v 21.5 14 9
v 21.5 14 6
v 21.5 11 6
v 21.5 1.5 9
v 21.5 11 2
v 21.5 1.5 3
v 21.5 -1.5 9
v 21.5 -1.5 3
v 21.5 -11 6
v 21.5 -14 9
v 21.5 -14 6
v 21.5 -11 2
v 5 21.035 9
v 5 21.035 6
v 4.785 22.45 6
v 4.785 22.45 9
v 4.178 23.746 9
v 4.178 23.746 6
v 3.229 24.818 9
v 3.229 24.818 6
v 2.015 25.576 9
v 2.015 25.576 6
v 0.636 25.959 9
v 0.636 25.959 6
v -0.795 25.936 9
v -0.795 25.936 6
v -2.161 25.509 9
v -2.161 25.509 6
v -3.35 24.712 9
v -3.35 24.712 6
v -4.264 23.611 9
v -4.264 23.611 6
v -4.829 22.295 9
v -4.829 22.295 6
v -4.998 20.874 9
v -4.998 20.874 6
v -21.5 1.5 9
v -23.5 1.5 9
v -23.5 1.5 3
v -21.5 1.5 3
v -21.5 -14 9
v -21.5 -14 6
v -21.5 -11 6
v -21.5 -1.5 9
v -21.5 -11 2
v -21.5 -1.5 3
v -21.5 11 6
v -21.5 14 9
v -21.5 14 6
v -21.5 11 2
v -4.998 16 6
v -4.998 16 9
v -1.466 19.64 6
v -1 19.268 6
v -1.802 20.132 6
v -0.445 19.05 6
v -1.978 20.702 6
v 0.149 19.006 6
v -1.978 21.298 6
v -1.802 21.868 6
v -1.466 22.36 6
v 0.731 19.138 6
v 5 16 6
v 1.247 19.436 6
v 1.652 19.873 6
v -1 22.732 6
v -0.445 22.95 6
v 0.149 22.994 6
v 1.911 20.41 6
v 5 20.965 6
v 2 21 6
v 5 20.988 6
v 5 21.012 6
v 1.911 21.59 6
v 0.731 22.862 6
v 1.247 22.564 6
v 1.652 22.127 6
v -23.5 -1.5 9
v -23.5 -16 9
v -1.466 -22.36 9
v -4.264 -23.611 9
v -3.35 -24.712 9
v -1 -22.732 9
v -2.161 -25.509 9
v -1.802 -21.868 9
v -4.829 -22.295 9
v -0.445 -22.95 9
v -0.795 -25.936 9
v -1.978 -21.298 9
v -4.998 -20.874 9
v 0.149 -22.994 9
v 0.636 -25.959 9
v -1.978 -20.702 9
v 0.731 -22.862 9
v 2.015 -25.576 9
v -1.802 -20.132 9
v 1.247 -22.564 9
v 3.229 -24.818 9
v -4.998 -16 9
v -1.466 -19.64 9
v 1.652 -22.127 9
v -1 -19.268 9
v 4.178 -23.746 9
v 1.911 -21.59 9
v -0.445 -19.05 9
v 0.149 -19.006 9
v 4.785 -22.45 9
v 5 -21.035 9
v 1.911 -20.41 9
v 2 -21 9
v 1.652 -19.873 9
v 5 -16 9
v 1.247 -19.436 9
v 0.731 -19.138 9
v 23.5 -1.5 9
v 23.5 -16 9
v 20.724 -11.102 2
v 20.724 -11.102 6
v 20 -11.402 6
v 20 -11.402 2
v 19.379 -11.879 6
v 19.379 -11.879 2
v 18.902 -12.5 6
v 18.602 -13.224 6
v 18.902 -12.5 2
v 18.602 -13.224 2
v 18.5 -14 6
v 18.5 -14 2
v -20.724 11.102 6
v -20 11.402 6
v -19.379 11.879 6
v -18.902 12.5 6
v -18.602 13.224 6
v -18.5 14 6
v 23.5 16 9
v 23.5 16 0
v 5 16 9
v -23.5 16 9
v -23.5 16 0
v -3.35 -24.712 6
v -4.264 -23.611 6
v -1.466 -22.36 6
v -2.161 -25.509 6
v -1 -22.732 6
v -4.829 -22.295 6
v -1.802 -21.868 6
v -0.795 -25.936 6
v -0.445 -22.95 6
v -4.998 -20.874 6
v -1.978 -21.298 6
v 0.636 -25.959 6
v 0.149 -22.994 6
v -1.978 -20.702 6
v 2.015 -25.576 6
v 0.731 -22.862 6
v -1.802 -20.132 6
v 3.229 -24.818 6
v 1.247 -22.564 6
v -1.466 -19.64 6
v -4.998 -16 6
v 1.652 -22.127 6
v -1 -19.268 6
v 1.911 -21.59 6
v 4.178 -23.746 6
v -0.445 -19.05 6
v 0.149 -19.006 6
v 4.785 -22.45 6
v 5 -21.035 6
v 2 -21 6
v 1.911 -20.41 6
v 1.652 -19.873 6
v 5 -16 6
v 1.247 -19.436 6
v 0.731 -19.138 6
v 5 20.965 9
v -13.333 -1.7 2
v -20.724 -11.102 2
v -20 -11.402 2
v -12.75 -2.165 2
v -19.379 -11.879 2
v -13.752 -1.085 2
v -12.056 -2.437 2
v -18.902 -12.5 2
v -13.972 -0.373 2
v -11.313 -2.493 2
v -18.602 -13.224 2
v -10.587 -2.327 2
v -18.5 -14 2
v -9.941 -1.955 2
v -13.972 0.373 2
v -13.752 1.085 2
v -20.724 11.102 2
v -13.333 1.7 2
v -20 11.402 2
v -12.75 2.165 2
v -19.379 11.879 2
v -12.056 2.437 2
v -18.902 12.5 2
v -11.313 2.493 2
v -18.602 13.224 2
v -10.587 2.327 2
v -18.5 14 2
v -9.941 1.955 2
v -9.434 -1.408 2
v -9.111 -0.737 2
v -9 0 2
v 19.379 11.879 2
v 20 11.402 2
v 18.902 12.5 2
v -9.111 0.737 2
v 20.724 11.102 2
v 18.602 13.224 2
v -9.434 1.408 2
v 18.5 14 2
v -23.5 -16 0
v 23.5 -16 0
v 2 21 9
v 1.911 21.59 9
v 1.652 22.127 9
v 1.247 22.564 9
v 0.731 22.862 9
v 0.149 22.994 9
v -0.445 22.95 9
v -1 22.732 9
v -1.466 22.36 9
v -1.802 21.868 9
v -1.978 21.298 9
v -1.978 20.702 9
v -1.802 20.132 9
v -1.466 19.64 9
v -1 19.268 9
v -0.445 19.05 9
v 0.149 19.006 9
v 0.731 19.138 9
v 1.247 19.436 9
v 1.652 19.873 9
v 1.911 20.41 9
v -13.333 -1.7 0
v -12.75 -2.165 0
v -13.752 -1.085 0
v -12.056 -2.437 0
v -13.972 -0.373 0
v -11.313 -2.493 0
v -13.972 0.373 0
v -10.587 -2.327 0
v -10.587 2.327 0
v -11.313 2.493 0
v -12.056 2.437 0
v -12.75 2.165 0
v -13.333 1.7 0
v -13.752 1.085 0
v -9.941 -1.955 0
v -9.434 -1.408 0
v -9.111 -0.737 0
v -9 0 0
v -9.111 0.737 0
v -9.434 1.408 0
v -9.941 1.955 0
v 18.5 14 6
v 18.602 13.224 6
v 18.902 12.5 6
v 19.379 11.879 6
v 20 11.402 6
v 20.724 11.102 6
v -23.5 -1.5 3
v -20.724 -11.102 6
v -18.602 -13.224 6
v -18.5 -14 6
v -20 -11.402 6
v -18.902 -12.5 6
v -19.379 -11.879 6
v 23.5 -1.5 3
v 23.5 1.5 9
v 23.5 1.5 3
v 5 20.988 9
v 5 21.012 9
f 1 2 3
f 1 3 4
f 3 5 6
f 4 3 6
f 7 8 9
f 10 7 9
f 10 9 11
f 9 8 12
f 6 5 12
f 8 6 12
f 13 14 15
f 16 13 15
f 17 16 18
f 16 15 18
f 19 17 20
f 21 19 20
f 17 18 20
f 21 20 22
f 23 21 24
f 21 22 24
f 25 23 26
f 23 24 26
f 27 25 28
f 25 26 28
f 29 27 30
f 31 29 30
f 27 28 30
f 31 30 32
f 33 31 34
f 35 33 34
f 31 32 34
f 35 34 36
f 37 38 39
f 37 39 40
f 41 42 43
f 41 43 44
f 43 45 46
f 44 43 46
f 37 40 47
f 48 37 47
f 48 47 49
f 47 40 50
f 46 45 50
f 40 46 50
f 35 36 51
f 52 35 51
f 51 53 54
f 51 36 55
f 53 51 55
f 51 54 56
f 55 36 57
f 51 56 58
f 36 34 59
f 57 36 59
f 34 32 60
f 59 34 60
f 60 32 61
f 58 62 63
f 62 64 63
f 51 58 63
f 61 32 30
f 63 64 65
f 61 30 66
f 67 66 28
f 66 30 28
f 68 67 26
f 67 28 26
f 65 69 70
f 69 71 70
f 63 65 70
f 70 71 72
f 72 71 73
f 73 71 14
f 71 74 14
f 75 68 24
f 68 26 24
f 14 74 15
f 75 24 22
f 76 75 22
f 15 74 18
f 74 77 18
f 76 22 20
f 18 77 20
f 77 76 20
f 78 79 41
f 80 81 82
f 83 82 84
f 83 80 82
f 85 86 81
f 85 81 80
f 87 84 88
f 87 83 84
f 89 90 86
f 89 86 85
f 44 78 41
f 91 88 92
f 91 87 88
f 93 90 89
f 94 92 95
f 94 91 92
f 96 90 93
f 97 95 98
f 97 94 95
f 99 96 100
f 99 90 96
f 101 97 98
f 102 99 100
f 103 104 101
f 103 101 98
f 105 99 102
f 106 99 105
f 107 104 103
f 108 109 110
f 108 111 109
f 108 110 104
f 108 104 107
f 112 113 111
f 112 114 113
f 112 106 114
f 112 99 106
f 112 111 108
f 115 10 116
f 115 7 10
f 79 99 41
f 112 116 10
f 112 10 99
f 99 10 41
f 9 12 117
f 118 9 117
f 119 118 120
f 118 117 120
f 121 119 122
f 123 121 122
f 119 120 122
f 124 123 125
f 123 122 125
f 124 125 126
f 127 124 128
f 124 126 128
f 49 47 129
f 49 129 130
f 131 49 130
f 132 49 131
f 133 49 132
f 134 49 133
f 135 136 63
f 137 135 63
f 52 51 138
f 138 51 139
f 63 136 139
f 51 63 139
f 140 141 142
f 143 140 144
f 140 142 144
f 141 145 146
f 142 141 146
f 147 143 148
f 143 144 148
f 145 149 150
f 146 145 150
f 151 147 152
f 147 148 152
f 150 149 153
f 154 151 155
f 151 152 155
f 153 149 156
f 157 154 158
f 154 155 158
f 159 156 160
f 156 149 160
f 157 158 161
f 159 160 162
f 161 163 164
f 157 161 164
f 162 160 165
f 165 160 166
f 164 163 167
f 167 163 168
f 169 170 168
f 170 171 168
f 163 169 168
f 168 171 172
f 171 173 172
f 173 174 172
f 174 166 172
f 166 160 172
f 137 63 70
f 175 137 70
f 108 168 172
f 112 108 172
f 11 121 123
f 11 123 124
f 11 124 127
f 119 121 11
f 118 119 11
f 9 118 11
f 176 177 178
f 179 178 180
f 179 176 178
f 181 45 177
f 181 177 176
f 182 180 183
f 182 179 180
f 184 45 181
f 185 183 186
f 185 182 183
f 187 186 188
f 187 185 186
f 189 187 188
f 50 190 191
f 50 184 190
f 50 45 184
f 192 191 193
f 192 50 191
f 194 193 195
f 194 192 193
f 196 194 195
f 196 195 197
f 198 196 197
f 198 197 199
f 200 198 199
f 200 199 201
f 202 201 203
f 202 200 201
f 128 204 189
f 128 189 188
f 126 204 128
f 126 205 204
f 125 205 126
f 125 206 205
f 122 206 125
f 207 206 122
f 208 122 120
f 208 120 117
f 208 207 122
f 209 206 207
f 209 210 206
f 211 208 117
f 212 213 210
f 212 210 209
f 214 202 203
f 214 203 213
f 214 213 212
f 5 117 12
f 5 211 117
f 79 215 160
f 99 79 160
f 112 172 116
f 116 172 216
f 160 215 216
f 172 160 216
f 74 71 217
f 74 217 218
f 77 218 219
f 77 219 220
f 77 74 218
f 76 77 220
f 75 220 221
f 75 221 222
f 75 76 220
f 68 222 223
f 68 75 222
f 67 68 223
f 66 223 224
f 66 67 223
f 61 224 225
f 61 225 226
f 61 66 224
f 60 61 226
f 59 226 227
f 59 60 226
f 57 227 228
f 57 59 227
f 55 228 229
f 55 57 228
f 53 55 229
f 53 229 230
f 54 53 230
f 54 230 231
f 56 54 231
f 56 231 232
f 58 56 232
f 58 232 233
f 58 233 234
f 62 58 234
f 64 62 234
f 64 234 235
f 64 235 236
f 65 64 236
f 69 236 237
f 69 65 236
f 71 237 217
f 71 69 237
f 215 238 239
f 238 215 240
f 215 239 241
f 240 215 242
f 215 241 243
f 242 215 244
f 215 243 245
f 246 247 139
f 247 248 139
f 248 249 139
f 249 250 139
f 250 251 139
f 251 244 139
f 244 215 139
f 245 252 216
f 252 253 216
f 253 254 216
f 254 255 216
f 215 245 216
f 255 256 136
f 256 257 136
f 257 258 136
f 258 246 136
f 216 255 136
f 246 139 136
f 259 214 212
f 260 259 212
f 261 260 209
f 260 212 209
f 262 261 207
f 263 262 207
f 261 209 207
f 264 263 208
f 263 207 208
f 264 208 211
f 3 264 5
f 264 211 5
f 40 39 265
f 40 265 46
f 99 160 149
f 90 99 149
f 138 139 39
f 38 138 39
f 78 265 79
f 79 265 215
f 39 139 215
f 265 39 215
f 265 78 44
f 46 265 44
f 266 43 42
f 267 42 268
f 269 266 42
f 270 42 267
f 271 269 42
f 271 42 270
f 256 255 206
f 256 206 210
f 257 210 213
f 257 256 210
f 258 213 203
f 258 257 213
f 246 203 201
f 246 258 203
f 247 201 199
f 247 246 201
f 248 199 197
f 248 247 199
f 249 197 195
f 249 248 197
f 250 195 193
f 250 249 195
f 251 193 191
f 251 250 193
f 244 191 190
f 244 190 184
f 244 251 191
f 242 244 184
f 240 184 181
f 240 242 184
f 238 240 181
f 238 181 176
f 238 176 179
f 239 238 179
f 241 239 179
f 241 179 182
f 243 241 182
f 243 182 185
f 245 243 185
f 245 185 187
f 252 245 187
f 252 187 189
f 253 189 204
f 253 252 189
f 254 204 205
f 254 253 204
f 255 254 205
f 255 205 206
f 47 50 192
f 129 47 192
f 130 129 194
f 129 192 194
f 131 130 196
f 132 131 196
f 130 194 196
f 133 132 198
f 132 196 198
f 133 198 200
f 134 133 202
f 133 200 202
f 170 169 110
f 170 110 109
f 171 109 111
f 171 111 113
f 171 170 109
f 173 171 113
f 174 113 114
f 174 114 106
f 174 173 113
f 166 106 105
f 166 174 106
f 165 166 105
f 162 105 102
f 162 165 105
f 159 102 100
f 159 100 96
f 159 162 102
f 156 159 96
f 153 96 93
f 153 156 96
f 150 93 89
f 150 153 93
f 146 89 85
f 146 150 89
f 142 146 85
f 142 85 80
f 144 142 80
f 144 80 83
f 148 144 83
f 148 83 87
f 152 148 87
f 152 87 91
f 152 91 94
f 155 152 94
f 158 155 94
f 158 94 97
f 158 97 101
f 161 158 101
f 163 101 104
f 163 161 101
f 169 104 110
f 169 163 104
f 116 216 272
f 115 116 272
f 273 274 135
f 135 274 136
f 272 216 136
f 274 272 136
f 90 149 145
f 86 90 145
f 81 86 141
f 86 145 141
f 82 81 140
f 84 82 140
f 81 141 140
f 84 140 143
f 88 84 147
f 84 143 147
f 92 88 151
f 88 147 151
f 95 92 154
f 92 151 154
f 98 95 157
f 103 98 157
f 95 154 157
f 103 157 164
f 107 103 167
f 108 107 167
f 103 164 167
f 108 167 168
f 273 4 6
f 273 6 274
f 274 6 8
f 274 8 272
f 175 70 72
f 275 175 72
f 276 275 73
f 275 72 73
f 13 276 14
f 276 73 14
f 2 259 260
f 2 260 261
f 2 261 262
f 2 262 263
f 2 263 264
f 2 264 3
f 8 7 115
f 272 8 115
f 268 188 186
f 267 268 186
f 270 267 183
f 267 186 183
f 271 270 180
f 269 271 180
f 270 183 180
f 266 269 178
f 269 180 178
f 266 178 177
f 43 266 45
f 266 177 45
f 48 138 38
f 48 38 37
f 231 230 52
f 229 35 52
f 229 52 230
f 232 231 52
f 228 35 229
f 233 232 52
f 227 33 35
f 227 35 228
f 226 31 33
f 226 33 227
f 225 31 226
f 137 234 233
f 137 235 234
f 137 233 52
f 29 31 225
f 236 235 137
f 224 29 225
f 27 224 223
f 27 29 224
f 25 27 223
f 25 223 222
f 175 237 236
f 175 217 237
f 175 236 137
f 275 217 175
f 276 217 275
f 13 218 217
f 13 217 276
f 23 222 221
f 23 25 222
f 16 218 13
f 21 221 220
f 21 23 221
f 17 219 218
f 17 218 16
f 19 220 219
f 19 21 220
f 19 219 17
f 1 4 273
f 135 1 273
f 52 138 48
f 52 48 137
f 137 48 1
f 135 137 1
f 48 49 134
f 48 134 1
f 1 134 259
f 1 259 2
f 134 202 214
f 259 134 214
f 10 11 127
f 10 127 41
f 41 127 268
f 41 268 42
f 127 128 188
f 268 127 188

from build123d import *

# Parameters (mm, degrees)
F1_DEPTH = 9
F0_R     = 2.5
F2_DEPTH = 2
F3_DEPTH = 6
F4_START = 6
F0_R_2   = 2
F4_DEPTH = 3
F5_W     = 2
F5_H     = 3
F6_DEPTH = 6


with BuildPart() as f1:
    # F0 (on Top) → F1 (new body)
    with BuildSketch(Plane.XY):
        Polygon((-4.9984134711, 16), (-23.5, 16), (-23.5, -16), (-4.9984134711, -16), (4.9998776676, -16), (23.5, -16), (23.5, 16), (4.9998776676, 16), align=None)
        Polygon((-21.5, 11), (-21.5, 14), (-18.5, 14), (18.5, 14), (21.5, 14), (21.5, 11), (21.5, -11), (21.5, -14), (18.5, -14), (-18.5, -14), (-21.5, -14), (-21.5, -11), align=None, mode=Mode.SUBTRACT)
    extrude(amount=F1_DEPTH)

    # F0 (on Top) → F2 (join)
    with BuildSketch(Plane.XY):
        with BuildLine():
            Line((18.5, 14), (-18.5, 14))
            ThreePointArc((-18.5, 14), (-19.3786796564, 11.8786796564), (-21.5, 11))
            Line((-21.5, 11), (-21.5, -11))
            ThreePointArc((-21.5, -11), (-19.3786796564, -11.8786796564), (-18.5, -14))
            Line((-18.5, -14), (18.5, -14))
            ThreePointArc((18.5, -14), (19.3786796564, -11.8786796564), (21.5, -11))
            Line((21.5, -11), (21.5, 11))
            ThreePointArc((21.5, 11), (19.3786796564, 11.8786796564), (18.5, 14))
        make_face()
        with Locations((-11.5, 0)):
            Circle(F0_R, mode=Mode.SUBTRACT)
    extrude(amount=F2_DEPTH)

    # F0 (on Top) → F3 (join)
    with BuildSketch(Plane.XY):
        with BuildLine():
            Line((-18.5, 14), (-21.5, 14))
            Line((-21.5, 14), (-21.5, 11))
            ThreePointArc((-21.5, 11), (-19.3786796564, 11.8786796564), (-18.5, 14))
        make_face()
        with BuildLine():
            Line((21.5, 14), (18.5, 14))
            ThreePointArc((18.5, 14), (19.3786796564, 11.8786796564), (21.5, 11))
            Line((21.5, 11), (21.5, 14))
        make_face()
        with BuildLine():
            Line((21.5, -14), (21.5, -11))
            ThreePointArc((21.5, -11), (19.3786796564, -11.8786796564), (18.5, -14))
            Line((18.5, -14), (21.5, -14))
        make_face()
        with BuildLine():
            ThreePointArc((-18.5, -14), (-19.3786796564, -11.8786796564), (-21.5, -11))
            Line((-21.5, -11), (-21.5, -14))
            Line((-21.5, -14), (-18.5, -14))
        make_face()
    extrude(amount=F3_DEPTH)

    # F0 (on Top) → F4 (join)
    with BuildSketch(Plane.XY.offset(F4_START)):
        with BuildLine():
            Line((-4.9984134711, 20.8740525043), (-4.9984134711, 16))
            Line((-4.9984134711, 16), (4.9998776676, 16))
            Line((4.9998776676, 16), (4.9998776676, 20.9650241638))
            ThreePointArc((4.9998776676, 20.9650241638), (5, 21), (4.9998776676, 21.0349758362))
            ThreePointArc((4.9998776676, 21.0349758362), (-0.0804649964, 25.9993524965), (-4.9984134711, 20.8740525043))
        make_face()
        with Locations((0, 21)):
            Circle(F0_R_2, mode=Mode.SUBTRACT)
        with BuildLine():
            Line((4.9998776676, -16), (-4.9984134711, -16))
            Line((-4.9984134711, -16), (-4.9984134711, -20.8740525043))
            ThreePointArc((-4.9984134711, -20.8740525043), (-0.0804649964, -25.9993524965), (4.9998776676, -21.0349758362))
            Line((4.9998776676, -21.0349758362), (4.9998776676, -20.9650241638))
            Line((4.9998776676, -20.9650241638), (4.9998776676, -16))
        make_face()
        with Locations((0, -21)):
            Circle(F0_R_2, mode=Mode.SUBTRACT)
    extrude(amount=F4_DEPTH)

    # F5 (on face) → F6 (cut)
    with BuildSketch(Plane.XY.offset(9)):
        with Locations((-22.5, 0)):
            Rectangle(F5_W, F5_H)
        with Locations((22.5, 0)):
            Rectangle(F5_W, F5_H)
    extrude(amount=-F6_DEPTH, mode=Mode.SUBTRACT)


solid = f1.part
